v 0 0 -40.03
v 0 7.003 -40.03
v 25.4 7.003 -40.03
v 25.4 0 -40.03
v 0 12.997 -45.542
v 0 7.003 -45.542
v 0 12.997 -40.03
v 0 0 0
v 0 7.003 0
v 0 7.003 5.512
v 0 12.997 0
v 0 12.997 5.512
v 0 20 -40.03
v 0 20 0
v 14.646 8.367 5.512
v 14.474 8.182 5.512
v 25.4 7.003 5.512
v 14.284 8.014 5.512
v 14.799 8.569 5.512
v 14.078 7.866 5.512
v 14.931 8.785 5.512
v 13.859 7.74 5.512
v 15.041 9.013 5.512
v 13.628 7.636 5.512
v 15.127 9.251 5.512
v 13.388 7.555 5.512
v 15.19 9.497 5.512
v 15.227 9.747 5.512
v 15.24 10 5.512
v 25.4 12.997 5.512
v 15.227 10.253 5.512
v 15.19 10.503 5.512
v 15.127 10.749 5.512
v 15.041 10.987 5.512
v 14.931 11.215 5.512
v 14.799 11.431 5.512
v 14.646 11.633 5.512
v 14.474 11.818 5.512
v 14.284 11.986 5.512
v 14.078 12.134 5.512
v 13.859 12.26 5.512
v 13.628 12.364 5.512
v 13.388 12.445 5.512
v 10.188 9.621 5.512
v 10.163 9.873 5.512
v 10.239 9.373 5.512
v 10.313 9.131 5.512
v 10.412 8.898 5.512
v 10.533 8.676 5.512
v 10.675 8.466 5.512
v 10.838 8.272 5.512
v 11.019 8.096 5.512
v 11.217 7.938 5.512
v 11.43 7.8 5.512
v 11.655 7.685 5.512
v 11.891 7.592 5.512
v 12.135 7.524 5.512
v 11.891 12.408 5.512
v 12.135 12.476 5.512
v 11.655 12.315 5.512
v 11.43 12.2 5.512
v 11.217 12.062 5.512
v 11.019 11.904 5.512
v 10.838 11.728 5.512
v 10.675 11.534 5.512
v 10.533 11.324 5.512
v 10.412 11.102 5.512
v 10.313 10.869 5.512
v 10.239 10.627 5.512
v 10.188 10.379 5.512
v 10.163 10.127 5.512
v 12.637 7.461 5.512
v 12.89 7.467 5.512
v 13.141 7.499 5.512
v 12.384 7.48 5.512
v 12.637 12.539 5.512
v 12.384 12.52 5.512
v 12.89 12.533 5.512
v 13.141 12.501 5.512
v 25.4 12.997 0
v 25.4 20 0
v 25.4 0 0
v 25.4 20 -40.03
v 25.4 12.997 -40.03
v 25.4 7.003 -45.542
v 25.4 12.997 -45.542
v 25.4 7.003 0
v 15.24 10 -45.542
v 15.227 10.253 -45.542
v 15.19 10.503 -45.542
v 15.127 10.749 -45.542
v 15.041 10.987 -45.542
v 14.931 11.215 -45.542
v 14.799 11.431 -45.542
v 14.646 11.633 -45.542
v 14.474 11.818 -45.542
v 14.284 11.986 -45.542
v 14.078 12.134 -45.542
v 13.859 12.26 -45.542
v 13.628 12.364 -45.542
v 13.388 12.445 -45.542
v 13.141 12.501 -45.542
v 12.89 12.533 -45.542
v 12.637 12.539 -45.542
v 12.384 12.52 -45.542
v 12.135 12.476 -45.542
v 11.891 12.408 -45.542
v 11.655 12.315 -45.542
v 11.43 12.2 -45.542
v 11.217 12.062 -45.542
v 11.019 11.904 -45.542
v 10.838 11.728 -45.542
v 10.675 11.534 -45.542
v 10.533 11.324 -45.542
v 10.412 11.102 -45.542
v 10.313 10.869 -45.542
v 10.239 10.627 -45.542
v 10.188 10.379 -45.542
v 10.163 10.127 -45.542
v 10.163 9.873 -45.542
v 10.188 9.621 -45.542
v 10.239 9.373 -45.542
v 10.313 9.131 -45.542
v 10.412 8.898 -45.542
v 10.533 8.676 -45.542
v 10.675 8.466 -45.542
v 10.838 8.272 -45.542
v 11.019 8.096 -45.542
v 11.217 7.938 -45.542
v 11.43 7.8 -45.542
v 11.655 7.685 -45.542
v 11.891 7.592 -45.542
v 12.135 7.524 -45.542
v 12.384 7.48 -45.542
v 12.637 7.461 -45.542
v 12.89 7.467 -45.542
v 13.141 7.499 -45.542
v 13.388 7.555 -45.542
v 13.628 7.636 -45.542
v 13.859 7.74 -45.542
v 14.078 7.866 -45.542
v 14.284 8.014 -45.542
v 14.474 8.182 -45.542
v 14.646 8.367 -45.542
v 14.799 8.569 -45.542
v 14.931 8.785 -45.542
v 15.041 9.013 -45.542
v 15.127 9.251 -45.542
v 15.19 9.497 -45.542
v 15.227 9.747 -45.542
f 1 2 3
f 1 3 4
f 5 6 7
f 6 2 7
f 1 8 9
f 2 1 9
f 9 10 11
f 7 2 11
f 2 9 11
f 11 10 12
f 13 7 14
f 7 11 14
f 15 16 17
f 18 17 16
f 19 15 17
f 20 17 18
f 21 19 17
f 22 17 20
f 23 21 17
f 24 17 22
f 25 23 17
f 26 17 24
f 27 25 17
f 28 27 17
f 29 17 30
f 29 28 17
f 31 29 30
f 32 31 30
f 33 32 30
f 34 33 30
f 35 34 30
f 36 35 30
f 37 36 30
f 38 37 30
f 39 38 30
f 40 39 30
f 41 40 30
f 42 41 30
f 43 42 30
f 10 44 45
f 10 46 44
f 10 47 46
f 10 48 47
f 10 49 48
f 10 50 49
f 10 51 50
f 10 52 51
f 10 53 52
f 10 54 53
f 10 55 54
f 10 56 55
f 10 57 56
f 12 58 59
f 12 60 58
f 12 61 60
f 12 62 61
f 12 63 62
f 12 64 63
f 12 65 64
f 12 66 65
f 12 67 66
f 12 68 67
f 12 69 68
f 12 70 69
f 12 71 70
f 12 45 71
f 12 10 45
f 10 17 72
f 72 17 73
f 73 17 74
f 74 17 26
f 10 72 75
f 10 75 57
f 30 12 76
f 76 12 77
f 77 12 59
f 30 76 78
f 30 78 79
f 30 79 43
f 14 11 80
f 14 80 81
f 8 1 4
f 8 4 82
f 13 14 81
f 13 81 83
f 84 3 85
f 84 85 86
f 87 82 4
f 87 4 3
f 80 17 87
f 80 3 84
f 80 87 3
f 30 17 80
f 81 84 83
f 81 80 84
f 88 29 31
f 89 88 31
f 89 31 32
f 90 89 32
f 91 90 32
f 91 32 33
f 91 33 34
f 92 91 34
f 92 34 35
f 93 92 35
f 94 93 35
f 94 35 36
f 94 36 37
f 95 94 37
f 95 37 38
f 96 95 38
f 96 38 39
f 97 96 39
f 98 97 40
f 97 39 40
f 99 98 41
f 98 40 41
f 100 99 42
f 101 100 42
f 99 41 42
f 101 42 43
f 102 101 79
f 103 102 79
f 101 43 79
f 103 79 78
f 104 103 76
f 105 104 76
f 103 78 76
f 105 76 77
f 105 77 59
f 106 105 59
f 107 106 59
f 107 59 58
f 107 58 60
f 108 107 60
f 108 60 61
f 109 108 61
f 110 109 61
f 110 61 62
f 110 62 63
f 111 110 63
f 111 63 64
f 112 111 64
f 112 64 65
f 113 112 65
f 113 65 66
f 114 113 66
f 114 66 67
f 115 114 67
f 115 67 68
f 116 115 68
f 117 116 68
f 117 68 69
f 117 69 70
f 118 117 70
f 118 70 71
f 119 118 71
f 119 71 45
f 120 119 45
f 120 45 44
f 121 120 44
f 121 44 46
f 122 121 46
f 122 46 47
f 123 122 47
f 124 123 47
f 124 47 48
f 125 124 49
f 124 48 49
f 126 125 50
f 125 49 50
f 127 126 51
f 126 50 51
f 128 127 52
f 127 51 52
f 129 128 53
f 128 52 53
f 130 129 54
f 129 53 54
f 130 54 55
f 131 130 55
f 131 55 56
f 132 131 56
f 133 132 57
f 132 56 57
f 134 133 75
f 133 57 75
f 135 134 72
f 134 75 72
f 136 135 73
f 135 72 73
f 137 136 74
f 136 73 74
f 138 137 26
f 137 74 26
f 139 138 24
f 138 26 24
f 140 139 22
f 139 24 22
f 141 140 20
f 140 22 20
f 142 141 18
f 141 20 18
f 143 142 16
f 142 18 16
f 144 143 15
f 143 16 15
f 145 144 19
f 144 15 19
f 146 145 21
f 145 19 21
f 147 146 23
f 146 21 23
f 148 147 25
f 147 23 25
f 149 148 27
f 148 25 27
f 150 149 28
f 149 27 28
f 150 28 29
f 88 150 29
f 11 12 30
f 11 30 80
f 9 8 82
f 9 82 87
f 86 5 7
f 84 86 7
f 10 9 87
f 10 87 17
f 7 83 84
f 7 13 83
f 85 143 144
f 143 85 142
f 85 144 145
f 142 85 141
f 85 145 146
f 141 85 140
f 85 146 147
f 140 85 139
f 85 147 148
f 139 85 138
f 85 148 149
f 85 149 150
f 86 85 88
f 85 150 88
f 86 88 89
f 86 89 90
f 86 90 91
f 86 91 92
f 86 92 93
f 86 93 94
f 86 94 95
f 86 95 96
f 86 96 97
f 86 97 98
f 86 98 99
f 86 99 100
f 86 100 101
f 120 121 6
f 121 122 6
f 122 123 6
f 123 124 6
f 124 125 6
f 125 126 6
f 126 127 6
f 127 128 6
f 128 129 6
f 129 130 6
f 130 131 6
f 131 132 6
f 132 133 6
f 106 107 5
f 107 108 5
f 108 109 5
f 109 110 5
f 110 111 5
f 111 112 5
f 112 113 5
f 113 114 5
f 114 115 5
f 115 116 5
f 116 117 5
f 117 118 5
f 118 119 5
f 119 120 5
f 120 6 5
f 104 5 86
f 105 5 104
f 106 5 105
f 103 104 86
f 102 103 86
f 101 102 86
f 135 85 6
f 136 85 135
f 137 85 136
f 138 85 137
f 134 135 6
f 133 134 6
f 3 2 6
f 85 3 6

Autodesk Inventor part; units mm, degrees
ref_plane "YZ Plane" through (0, 0, 0) normal (1, 0, 0) x (0, 1, 0)
ref_plane "XZ Plane" through (0, 0, 0) normal (0, 1, 0) x (-1, 0, 0)
ref_plane "XY Plane" through (0, 0, 0) normal (0, 0, 1) x (1, 0, 0)
sketch "Sketch1" plane through (0, 0, 0) normal (1, 0, 0) x (0, 1, 0)
  line L0 (20, 0) -> (20, -40.0304)
  line L1 (20, -40.0304) -> (0, -40.0304)
  line L2 (0, -40.0304) -> (0, 0)
  line L3 (12.9972, 0) -> (7.0028, 0)
  line L4 (7.0028, 0) -> (7.0028, 5.5118)
  line L5 (7.0028, 5.5118) -> (12.9972, 5.5118)
  line L6 (12.9972, 5.5118) -> (12.9972, 0)
  line L7 (12.9972, -40.0304) -> (7.0028, -40.0304)
  line L8 (7.0028, -40.0304) -> (7.0028, -45.5422)
  line L9 (7.0028, -45.5422) -> (12.9972, -45.5422)
  line L10 (12.9972, -45.5422) -> (12.9972, -40.0304)
  line L11 (0, 0) -> (7.0028, 0)
  line L12 (12.9972, 0) -> (20, 0)
  dimension "d0" = 20
  dimension "d1" = 40.0304
  dimension "d2" = 5.5118
  dimension "d3" = 5.9944
  dimension "d4" = 5.5118
  dimension "d5" = 7.0028
  dimension "d6" = 7.0028
  dimension "d7" = 5.9944
extrude "Extrusion1" add sketch "Sketch1" along normal blind 25.4
sketch "Sketch2" plane through (0, 7.0028, 5.5118) normal (0, 0, 1) x (1, 0, 0)
  line L0 (0, 5.9944) -> (25.4, 5.9944) projected
  line L1 (25.4, 12.9972) -> (25.4, 5.9944) projected
  line L2 (0, 12.9972) -> (25.4, 12.9972) projected
  line L3 (0, 12.9972) -> (0, 5.9944) projected
  line L4 (0, 5.9944) -> (0, 0) projected
  line L5 (0, 0) -> (25.4, 0) projected
  line L6 (25.4, 5.9944) -> (25.4, 0) projected
  line L7 (0, 5.9944) -> (25.4, 5.9944) projected
  line L8 (0, 0) -> (25.4, 0) projected
  line L9 (0, 0) -> (0, -7.0028) projected
  line L10 (0, -7.0028) -> (25.4, -7.0028) projected
  line L11 (25.4, 0) -> (25.4, -7.0028) projected
  circle A0 centre (12.7, 2.9972) radius 2.54
  dimension "d10" = 5.08
extrude "Extrusion2" cut sketch "Sketch2" against normal blind 127 contours A0
equation "\"d4\" = d2"
equation "\"d5\" = 0.5 * d0 - 0.5 * d3"
equation "\"d6\" = d5"
equation "\"d7\" = d3"
properties part number "FrameSpacer"
